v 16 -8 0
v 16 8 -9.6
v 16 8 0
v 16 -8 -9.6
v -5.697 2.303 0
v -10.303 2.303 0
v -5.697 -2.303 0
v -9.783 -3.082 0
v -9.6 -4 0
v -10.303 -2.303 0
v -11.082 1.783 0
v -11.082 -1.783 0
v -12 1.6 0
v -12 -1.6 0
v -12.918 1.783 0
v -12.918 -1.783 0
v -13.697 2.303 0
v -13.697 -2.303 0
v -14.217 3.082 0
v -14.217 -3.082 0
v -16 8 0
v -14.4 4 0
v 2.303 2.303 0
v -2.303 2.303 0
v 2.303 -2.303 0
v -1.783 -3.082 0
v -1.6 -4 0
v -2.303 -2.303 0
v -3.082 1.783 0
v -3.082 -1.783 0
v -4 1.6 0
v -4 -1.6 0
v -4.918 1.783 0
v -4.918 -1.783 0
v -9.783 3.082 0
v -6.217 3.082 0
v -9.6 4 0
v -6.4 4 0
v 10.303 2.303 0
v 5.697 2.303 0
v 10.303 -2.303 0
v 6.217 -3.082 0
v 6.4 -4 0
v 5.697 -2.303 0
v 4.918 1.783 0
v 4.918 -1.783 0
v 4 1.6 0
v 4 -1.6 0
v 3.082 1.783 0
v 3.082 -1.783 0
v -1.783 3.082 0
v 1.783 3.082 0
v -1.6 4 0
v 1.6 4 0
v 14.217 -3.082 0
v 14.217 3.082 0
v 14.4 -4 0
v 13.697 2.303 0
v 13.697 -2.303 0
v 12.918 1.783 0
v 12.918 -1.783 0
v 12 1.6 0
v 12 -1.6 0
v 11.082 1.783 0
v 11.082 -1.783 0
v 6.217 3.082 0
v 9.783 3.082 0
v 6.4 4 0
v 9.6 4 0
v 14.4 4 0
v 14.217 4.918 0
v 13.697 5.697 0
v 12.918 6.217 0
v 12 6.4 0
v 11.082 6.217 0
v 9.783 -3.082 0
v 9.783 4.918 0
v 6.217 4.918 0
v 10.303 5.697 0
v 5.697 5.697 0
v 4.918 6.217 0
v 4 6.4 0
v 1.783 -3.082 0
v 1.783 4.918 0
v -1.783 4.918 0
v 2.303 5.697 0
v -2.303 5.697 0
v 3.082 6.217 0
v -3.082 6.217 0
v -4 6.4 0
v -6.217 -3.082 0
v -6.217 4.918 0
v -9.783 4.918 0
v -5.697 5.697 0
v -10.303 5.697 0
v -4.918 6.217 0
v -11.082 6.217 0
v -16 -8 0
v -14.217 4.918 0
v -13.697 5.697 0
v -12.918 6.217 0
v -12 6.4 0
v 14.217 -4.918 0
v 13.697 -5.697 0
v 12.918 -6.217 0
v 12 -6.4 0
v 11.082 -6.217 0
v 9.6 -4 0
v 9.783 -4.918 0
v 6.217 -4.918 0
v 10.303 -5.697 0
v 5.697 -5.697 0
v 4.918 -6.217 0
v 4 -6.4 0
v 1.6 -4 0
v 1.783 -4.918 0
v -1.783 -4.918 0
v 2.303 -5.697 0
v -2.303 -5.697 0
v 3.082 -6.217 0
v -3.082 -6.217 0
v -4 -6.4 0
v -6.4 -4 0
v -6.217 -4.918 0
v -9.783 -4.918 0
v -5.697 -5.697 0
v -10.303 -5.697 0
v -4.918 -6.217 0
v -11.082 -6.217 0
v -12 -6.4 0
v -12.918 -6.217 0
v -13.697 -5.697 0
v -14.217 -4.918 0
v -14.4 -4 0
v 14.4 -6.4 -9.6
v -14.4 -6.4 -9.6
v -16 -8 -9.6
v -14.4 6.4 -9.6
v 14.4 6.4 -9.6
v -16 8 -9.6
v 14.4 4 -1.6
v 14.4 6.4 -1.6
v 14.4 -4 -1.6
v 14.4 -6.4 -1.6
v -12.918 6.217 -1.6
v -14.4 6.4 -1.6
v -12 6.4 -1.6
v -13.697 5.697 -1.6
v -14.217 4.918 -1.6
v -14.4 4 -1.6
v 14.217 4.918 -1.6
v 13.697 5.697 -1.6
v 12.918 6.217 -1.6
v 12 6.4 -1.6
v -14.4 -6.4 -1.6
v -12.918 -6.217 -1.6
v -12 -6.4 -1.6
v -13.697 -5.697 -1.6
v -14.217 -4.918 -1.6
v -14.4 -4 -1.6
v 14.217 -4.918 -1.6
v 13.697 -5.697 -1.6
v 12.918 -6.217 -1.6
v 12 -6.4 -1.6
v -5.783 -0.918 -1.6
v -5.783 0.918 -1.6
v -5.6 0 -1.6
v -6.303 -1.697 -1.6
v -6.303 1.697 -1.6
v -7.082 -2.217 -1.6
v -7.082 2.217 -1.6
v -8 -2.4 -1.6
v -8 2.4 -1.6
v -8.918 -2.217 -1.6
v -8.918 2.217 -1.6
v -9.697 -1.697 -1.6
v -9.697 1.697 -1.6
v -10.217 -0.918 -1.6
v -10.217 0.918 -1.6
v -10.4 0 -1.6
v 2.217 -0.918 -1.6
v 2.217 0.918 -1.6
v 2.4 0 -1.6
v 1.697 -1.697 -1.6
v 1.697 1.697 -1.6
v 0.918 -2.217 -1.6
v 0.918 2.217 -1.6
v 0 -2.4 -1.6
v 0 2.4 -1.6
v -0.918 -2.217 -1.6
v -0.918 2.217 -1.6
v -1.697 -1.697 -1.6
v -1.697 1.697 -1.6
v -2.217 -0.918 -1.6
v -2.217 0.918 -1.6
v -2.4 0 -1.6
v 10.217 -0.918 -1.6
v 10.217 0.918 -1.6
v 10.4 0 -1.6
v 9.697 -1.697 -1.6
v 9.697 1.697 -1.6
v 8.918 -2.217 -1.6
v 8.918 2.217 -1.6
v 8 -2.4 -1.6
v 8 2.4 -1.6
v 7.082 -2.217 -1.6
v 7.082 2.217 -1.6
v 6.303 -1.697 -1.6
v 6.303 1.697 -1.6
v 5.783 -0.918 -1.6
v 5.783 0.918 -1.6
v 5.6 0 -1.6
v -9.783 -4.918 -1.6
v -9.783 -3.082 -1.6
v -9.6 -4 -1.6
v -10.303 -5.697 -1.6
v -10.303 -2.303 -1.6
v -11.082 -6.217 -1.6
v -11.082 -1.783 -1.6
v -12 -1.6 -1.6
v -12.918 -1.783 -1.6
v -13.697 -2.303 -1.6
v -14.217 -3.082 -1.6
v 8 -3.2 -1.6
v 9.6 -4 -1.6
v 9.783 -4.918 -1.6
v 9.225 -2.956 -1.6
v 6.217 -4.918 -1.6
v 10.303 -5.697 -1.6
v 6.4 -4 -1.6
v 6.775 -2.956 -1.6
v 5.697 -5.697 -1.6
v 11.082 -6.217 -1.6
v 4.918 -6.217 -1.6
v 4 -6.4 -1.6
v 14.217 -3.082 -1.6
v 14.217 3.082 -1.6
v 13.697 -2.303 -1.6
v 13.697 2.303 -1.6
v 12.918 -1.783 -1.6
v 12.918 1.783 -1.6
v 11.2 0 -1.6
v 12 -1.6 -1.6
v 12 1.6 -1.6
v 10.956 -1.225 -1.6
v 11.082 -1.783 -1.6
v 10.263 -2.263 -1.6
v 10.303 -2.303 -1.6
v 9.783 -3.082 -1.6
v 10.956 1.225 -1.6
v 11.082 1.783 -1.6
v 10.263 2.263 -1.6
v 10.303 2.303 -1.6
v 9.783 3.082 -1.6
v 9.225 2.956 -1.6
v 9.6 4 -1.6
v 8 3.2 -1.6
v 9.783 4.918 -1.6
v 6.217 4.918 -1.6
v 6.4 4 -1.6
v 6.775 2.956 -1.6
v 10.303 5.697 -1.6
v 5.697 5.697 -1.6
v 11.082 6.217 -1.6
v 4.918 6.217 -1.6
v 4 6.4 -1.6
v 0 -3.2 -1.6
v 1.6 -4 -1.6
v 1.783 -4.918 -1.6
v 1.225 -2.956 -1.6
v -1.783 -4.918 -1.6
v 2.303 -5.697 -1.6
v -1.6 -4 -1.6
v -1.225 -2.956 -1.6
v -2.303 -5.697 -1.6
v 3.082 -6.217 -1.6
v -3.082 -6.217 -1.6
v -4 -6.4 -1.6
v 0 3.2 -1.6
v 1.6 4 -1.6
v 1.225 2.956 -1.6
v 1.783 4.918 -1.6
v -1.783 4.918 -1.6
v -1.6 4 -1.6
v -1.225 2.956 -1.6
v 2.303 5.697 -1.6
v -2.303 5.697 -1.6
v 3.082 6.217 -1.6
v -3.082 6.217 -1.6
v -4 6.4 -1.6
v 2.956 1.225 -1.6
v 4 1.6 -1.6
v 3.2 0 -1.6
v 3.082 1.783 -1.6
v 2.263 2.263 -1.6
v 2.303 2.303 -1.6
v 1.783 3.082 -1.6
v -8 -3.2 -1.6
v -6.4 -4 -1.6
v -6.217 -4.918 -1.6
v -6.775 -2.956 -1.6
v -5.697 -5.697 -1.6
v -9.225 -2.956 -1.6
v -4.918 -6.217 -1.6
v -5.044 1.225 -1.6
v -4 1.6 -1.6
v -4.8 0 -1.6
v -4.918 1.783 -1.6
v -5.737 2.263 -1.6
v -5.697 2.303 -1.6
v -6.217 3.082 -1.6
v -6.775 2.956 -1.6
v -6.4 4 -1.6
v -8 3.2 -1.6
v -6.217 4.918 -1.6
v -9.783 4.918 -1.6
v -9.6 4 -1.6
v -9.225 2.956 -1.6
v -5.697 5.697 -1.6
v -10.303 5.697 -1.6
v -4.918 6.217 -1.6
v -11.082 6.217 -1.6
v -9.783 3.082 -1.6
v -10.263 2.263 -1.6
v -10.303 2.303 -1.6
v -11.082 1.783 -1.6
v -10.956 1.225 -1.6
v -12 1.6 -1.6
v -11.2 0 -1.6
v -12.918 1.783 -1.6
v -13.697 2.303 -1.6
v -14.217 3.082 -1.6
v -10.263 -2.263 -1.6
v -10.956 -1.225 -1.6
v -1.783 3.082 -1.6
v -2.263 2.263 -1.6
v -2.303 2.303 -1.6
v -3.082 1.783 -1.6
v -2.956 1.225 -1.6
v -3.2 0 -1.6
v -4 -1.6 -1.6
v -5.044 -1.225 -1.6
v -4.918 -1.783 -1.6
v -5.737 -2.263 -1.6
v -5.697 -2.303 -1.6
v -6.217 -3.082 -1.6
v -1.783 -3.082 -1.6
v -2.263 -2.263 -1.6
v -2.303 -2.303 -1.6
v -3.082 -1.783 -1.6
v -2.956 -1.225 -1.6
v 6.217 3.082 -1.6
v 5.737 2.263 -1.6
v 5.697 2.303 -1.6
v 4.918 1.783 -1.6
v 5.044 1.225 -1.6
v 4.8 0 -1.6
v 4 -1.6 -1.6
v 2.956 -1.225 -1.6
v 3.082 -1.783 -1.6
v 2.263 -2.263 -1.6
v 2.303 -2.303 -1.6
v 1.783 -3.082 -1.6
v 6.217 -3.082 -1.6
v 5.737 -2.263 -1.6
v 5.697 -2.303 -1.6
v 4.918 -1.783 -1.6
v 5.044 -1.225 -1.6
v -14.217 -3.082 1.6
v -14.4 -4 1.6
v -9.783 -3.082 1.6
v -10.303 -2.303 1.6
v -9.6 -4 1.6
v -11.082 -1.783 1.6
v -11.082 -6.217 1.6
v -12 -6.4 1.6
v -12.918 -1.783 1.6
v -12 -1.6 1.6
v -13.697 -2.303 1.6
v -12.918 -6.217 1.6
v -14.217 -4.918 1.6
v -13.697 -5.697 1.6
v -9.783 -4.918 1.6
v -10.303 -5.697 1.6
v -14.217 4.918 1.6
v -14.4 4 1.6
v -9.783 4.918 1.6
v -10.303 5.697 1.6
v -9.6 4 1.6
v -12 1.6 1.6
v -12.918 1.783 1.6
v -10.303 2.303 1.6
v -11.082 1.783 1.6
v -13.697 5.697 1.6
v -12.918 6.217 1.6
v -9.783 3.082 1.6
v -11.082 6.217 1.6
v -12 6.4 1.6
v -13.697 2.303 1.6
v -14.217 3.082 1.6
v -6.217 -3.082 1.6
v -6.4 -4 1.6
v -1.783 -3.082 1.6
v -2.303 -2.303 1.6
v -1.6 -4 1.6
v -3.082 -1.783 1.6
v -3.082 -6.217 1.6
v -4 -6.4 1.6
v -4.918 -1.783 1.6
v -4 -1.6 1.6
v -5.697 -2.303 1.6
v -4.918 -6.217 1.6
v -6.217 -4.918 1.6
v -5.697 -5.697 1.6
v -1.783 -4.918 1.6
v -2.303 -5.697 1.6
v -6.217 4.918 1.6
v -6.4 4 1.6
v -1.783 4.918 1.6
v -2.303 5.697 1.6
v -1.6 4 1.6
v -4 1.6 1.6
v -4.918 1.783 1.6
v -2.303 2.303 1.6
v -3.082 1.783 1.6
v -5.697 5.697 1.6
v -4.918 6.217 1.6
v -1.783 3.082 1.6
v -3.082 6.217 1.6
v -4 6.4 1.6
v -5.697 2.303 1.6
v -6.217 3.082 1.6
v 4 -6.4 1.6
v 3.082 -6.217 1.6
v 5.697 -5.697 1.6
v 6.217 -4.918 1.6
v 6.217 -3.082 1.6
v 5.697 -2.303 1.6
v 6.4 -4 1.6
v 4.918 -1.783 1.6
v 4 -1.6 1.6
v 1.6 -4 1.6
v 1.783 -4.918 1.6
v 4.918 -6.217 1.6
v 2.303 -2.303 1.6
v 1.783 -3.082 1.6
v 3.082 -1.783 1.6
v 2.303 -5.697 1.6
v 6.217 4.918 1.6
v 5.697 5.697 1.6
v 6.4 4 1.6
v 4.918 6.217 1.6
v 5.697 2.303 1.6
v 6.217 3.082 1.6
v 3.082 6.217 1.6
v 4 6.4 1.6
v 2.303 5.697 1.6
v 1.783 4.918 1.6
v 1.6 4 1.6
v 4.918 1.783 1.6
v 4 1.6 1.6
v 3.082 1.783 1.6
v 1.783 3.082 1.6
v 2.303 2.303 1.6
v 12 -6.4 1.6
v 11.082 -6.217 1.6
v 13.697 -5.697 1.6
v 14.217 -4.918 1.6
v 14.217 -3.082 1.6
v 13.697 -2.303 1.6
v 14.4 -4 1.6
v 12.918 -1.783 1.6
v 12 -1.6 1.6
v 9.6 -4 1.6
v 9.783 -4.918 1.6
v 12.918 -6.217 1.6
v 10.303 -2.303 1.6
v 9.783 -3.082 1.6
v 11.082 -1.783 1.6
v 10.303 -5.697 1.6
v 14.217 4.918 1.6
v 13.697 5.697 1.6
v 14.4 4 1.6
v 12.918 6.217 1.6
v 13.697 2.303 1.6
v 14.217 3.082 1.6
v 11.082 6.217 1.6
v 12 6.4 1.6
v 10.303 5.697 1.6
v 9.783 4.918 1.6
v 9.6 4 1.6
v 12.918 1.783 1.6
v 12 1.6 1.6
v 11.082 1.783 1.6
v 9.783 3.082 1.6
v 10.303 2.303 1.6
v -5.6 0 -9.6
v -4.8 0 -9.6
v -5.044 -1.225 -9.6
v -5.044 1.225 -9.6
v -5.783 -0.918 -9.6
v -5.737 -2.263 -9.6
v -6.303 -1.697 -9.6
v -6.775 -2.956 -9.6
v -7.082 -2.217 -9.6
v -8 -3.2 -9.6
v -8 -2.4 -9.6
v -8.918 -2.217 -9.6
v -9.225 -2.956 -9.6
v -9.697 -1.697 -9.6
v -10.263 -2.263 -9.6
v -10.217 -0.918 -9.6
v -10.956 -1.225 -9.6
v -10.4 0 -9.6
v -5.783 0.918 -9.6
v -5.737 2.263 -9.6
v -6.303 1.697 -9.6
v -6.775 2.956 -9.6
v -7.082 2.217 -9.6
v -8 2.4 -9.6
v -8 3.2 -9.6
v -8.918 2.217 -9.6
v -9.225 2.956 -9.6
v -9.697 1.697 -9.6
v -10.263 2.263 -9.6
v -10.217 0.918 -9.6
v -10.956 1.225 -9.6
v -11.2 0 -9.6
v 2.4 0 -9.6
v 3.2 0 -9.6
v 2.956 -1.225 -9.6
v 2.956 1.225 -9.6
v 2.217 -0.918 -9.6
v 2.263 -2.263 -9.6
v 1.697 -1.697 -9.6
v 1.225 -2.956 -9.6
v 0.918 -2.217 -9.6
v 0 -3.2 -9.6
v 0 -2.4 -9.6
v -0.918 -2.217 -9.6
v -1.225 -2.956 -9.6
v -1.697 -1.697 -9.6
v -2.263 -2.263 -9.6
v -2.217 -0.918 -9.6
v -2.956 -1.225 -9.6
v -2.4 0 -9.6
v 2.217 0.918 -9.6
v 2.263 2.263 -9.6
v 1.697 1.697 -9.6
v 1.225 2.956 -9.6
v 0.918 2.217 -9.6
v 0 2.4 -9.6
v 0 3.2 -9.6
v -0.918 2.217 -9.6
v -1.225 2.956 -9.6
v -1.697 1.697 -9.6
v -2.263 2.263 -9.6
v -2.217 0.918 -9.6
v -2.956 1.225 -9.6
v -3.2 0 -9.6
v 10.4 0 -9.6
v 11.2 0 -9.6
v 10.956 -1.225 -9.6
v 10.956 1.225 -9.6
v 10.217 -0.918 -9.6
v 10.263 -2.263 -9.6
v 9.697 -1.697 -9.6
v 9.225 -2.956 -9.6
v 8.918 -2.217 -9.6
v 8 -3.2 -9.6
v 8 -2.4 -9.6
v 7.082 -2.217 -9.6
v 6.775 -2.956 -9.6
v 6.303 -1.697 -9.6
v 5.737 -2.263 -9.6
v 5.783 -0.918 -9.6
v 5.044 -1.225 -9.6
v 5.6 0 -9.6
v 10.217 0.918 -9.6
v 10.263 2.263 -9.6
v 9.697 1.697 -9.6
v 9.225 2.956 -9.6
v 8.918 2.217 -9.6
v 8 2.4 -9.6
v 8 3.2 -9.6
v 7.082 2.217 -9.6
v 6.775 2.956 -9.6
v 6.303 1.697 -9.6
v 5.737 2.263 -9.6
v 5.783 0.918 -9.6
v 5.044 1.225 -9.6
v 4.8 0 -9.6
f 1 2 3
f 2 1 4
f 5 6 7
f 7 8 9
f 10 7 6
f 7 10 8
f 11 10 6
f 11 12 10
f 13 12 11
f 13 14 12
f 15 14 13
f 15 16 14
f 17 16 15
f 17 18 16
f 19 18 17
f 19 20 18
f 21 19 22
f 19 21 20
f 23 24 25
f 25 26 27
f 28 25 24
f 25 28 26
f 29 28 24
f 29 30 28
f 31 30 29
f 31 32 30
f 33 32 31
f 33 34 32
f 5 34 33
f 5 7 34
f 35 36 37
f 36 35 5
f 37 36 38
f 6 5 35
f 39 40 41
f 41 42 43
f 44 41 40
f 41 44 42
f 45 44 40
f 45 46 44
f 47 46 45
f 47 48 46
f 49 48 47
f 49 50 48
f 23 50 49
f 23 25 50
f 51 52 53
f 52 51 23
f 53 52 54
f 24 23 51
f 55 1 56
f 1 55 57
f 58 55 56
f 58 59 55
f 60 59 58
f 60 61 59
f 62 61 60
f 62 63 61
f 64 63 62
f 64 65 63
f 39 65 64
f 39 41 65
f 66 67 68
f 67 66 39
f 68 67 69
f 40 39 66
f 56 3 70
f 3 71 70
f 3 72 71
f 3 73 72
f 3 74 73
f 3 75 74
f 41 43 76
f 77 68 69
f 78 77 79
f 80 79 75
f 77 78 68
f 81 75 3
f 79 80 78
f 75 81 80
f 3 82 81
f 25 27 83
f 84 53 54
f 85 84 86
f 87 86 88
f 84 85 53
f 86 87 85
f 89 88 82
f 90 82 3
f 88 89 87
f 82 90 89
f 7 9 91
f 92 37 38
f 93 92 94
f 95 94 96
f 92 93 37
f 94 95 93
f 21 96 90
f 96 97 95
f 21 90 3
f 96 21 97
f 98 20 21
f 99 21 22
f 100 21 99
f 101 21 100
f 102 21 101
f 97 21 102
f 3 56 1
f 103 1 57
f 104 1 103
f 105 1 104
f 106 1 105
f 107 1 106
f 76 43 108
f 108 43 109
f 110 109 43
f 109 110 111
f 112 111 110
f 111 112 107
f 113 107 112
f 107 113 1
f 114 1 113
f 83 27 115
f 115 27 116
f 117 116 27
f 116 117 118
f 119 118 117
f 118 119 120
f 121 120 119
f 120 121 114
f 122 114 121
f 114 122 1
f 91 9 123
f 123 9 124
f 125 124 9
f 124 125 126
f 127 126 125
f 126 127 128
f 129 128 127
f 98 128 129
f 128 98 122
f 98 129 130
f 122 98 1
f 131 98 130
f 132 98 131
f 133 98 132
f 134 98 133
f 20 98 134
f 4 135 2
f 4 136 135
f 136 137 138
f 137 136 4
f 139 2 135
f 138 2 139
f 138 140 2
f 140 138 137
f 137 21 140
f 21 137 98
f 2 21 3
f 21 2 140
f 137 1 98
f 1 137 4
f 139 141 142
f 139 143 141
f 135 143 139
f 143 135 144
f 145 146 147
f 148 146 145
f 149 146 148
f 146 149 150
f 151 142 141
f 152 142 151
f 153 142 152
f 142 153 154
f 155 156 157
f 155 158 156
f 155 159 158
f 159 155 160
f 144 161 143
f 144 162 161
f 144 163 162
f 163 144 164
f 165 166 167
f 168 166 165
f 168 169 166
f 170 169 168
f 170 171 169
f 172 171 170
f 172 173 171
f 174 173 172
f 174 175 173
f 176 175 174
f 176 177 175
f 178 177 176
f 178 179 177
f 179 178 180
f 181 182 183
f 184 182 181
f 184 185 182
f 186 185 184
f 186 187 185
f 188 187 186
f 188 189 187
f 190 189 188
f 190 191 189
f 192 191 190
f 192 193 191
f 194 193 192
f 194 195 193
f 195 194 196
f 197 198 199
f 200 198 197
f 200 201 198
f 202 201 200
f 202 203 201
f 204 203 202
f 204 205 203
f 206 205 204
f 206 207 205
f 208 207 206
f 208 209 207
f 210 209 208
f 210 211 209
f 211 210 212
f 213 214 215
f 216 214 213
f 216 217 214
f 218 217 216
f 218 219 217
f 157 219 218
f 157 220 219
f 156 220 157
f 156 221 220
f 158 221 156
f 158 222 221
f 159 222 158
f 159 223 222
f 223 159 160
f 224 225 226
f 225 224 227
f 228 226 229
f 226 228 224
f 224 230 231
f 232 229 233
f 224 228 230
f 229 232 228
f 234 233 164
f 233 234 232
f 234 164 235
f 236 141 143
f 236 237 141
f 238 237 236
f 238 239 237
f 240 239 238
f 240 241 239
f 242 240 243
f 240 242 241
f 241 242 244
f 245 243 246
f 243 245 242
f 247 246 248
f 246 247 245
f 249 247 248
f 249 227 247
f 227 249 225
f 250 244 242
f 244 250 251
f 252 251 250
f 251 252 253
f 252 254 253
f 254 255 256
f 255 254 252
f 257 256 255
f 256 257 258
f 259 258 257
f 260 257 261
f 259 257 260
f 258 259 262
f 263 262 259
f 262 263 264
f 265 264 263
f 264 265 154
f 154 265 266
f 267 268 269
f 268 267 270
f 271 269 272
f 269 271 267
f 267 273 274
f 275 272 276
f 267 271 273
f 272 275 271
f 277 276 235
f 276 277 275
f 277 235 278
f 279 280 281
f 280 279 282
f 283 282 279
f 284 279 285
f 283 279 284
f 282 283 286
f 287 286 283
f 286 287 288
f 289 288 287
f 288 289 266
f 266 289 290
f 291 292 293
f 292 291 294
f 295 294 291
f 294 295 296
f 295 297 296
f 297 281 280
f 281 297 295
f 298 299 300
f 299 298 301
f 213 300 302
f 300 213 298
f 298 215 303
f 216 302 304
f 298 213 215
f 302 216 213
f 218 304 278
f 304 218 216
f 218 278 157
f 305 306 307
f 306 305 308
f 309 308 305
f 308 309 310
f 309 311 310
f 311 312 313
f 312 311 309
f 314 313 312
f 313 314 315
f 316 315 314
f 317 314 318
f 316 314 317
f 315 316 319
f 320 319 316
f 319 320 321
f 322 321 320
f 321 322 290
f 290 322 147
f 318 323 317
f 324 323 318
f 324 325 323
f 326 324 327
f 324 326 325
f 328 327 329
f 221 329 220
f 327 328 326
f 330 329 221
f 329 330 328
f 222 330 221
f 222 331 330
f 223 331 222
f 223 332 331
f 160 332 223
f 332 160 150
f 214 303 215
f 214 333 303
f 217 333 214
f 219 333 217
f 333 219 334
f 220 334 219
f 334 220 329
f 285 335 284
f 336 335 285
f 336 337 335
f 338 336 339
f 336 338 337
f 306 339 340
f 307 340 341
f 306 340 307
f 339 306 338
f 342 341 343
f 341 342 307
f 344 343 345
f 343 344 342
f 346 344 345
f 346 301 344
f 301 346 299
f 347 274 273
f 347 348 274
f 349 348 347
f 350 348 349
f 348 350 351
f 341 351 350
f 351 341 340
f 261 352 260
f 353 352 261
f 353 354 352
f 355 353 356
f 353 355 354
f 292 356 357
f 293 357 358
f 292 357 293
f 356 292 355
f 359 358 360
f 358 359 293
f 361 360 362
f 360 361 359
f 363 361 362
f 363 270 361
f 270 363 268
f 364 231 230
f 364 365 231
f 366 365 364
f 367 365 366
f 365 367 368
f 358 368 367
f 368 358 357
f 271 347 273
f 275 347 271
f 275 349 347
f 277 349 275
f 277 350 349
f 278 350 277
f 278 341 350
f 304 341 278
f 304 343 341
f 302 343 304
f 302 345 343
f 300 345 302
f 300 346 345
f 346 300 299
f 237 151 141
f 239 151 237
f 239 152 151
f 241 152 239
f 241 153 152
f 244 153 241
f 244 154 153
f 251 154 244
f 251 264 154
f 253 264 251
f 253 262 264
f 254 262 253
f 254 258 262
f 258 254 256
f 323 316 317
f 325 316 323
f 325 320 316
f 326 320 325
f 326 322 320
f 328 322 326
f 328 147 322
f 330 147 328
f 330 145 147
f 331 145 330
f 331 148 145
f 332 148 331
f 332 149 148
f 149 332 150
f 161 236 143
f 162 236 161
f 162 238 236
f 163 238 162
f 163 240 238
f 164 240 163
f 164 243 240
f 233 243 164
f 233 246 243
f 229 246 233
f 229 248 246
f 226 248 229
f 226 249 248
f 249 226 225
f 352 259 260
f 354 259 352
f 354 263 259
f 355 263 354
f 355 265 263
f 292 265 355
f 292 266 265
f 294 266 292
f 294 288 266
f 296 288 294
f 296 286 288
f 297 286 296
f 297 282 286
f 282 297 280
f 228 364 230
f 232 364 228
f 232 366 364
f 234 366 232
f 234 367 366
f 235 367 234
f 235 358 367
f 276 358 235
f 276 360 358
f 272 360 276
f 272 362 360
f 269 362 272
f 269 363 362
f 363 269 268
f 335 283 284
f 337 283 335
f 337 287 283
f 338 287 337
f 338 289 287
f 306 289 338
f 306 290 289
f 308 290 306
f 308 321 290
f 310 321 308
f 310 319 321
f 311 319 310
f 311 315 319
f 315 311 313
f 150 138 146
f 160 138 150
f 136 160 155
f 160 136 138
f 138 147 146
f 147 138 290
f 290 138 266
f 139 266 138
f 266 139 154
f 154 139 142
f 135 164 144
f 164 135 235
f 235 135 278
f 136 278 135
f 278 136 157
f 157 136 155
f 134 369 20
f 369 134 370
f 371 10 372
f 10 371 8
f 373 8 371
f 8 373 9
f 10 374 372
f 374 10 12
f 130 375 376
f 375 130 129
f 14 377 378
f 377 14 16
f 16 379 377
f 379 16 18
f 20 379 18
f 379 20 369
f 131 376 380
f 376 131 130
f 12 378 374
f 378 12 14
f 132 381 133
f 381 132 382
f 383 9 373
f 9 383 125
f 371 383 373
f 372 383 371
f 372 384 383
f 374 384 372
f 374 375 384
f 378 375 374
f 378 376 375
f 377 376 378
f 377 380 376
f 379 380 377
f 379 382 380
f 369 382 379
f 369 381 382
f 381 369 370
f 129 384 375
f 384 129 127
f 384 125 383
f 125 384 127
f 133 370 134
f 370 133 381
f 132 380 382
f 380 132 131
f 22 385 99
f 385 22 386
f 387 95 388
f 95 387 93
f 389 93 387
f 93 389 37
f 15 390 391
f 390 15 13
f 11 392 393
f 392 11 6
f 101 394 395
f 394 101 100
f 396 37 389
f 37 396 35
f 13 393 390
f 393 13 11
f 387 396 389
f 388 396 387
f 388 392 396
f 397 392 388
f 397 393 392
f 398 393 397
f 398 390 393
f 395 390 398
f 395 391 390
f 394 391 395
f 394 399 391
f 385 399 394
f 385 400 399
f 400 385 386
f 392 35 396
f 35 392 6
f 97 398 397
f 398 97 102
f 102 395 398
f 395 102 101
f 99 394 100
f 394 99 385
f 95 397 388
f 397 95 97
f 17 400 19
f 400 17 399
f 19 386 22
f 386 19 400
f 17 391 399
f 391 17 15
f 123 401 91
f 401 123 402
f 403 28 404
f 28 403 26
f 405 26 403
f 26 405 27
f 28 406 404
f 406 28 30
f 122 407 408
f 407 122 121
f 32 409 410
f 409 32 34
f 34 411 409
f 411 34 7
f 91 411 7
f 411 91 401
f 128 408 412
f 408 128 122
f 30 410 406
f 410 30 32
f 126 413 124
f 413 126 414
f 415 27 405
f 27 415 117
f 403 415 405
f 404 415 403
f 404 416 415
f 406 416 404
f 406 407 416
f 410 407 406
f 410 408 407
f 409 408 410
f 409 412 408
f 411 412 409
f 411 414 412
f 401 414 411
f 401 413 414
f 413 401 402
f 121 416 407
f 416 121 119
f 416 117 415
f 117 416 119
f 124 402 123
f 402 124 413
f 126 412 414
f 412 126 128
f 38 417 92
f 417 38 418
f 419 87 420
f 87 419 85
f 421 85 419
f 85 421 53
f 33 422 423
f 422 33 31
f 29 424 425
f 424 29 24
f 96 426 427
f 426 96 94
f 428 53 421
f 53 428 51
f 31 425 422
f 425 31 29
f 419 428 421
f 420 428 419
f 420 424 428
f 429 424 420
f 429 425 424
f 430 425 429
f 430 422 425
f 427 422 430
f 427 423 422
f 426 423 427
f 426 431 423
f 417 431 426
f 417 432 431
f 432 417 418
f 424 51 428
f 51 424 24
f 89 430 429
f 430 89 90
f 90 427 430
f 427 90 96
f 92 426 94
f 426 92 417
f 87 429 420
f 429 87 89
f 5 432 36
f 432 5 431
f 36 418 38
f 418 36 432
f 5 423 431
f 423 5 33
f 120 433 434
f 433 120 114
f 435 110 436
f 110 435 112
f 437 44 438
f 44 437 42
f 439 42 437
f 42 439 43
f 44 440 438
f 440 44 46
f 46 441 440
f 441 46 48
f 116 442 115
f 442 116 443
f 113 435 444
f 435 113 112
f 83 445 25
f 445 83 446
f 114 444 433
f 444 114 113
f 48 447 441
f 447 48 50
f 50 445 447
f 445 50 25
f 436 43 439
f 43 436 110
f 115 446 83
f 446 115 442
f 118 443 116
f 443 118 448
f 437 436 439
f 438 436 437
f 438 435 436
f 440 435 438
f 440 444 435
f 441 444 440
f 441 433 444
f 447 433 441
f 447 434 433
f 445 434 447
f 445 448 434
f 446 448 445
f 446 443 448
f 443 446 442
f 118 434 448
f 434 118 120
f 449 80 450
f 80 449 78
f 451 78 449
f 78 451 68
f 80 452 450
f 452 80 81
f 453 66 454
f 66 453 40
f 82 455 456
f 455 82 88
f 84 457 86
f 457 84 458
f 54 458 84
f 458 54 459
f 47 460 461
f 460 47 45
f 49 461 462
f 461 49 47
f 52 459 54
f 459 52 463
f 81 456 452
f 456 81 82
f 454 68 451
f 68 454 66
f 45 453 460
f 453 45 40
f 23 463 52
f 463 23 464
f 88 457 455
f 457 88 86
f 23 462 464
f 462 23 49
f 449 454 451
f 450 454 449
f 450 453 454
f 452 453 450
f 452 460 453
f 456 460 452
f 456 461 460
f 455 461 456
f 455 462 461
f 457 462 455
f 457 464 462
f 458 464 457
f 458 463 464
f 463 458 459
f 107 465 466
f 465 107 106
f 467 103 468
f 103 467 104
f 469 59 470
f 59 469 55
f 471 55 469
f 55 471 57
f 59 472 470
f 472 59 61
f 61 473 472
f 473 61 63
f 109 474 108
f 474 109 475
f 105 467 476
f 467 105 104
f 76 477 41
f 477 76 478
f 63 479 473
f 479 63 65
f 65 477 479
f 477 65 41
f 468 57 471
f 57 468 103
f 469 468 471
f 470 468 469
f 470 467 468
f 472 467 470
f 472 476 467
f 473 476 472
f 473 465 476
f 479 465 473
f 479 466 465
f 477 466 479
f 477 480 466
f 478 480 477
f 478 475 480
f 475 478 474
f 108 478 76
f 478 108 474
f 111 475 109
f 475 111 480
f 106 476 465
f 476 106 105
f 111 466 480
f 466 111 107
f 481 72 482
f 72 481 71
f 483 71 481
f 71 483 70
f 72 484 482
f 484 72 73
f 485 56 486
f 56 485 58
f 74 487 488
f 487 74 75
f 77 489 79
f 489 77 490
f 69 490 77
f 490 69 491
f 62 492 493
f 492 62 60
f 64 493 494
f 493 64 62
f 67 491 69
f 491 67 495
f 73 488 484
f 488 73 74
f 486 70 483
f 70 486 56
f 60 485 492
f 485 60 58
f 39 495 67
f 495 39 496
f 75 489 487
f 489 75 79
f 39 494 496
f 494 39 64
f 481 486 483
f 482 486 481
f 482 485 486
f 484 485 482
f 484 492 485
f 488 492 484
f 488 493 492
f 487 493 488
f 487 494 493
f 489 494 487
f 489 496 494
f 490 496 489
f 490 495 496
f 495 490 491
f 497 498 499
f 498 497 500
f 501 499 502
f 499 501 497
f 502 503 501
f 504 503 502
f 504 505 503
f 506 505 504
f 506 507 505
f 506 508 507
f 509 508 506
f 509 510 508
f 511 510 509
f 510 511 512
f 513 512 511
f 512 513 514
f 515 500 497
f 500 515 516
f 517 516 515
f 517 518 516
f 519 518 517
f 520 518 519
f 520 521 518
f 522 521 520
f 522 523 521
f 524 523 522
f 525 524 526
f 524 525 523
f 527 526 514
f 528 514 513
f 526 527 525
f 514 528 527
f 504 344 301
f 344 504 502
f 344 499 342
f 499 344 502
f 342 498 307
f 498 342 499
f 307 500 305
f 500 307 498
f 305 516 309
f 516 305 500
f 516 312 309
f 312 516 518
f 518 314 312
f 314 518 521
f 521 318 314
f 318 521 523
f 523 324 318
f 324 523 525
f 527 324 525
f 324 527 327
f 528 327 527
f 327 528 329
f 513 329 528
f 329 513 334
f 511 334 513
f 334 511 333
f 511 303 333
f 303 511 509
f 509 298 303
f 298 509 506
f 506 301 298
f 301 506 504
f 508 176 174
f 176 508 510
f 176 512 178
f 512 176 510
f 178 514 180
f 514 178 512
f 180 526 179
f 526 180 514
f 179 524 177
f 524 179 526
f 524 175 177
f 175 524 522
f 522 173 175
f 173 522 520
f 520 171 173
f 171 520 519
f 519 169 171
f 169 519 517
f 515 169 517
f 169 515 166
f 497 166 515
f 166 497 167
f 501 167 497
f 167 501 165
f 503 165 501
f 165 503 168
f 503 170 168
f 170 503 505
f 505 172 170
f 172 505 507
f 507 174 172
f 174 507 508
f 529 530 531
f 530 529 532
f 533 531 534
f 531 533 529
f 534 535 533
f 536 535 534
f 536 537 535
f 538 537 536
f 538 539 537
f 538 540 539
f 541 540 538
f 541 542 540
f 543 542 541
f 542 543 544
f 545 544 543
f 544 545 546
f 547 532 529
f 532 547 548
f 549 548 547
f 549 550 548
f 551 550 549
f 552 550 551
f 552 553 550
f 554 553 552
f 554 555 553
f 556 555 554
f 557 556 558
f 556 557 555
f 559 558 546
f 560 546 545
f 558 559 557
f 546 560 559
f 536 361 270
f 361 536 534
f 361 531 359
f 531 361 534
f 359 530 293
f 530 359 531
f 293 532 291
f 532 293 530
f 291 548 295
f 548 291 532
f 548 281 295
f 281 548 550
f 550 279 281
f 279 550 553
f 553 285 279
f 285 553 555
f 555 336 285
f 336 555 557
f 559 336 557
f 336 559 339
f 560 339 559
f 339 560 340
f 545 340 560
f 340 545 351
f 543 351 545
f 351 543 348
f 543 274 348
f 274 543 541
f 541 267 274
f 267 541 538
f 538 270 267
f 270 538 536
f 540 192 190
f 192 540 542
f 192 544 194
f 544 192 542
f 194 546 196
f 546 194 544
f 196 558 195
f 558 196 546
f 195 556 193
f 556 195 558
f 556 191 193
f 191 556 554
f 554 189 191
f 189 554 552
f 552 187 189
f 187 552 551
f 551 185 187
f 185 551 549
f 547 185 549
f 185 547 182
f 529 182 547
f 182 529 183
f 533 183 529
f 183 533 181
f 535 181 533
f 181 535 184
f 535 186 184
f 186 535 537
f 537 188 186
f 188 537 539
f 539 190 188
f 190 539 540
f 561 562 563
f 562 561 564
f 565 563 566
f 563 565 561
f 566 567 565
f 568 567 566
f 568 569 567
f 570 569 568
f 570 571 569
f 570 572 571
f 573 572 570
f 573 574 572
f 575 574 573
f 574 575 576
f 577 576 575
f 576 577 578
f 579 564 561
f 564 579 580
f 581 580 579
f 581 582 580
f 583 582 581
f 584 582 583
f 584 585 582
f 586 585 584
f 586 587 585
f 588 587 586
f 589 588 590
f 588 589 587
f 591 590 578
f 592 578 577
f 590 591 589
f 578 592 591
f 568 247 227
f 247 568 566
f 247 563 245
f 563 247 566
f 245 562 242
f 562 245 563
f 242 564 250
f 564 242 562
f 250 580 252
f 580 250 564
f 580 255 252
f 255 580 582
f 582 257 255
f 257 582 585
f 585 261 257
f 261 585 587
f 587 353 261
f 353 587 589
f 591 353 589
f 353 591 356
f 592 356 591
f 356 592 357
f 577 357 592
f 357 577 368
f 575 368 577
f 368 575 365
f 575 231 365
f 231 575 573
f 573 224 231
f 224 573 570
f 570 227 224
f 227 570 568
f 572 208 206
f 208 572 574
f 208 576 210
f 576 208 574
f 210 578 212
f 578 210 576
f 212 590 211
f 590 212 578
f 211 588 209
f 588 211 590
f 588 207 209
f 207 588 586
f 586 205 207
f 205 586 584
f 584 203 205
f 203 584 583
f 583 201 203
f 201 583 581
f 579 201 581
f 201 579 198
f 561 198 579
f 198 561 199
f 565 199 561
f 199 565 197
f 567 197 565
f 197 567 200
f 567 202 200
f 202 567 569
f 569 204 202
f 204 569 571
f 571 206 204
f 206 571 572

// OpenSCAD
$fn=16;

render() scale(2/5) {
    difference() {
        translate([0, 0, -12]) cube([80, 40, 24], center=true);
        translate([0, 0, -16]) cube([72, 32, 24], center=true);
    }
    for(x=[-30:20:30], y=[-10, 10]) translate([x, y, 0])
        cylinder(8, d=12, center=true);
    for(x=[-20:20:20]) translate([x, 0, -24]) linear_extrude(24)
        difference() {
            circle(d=16);
            circle(d=12);
        }
}
